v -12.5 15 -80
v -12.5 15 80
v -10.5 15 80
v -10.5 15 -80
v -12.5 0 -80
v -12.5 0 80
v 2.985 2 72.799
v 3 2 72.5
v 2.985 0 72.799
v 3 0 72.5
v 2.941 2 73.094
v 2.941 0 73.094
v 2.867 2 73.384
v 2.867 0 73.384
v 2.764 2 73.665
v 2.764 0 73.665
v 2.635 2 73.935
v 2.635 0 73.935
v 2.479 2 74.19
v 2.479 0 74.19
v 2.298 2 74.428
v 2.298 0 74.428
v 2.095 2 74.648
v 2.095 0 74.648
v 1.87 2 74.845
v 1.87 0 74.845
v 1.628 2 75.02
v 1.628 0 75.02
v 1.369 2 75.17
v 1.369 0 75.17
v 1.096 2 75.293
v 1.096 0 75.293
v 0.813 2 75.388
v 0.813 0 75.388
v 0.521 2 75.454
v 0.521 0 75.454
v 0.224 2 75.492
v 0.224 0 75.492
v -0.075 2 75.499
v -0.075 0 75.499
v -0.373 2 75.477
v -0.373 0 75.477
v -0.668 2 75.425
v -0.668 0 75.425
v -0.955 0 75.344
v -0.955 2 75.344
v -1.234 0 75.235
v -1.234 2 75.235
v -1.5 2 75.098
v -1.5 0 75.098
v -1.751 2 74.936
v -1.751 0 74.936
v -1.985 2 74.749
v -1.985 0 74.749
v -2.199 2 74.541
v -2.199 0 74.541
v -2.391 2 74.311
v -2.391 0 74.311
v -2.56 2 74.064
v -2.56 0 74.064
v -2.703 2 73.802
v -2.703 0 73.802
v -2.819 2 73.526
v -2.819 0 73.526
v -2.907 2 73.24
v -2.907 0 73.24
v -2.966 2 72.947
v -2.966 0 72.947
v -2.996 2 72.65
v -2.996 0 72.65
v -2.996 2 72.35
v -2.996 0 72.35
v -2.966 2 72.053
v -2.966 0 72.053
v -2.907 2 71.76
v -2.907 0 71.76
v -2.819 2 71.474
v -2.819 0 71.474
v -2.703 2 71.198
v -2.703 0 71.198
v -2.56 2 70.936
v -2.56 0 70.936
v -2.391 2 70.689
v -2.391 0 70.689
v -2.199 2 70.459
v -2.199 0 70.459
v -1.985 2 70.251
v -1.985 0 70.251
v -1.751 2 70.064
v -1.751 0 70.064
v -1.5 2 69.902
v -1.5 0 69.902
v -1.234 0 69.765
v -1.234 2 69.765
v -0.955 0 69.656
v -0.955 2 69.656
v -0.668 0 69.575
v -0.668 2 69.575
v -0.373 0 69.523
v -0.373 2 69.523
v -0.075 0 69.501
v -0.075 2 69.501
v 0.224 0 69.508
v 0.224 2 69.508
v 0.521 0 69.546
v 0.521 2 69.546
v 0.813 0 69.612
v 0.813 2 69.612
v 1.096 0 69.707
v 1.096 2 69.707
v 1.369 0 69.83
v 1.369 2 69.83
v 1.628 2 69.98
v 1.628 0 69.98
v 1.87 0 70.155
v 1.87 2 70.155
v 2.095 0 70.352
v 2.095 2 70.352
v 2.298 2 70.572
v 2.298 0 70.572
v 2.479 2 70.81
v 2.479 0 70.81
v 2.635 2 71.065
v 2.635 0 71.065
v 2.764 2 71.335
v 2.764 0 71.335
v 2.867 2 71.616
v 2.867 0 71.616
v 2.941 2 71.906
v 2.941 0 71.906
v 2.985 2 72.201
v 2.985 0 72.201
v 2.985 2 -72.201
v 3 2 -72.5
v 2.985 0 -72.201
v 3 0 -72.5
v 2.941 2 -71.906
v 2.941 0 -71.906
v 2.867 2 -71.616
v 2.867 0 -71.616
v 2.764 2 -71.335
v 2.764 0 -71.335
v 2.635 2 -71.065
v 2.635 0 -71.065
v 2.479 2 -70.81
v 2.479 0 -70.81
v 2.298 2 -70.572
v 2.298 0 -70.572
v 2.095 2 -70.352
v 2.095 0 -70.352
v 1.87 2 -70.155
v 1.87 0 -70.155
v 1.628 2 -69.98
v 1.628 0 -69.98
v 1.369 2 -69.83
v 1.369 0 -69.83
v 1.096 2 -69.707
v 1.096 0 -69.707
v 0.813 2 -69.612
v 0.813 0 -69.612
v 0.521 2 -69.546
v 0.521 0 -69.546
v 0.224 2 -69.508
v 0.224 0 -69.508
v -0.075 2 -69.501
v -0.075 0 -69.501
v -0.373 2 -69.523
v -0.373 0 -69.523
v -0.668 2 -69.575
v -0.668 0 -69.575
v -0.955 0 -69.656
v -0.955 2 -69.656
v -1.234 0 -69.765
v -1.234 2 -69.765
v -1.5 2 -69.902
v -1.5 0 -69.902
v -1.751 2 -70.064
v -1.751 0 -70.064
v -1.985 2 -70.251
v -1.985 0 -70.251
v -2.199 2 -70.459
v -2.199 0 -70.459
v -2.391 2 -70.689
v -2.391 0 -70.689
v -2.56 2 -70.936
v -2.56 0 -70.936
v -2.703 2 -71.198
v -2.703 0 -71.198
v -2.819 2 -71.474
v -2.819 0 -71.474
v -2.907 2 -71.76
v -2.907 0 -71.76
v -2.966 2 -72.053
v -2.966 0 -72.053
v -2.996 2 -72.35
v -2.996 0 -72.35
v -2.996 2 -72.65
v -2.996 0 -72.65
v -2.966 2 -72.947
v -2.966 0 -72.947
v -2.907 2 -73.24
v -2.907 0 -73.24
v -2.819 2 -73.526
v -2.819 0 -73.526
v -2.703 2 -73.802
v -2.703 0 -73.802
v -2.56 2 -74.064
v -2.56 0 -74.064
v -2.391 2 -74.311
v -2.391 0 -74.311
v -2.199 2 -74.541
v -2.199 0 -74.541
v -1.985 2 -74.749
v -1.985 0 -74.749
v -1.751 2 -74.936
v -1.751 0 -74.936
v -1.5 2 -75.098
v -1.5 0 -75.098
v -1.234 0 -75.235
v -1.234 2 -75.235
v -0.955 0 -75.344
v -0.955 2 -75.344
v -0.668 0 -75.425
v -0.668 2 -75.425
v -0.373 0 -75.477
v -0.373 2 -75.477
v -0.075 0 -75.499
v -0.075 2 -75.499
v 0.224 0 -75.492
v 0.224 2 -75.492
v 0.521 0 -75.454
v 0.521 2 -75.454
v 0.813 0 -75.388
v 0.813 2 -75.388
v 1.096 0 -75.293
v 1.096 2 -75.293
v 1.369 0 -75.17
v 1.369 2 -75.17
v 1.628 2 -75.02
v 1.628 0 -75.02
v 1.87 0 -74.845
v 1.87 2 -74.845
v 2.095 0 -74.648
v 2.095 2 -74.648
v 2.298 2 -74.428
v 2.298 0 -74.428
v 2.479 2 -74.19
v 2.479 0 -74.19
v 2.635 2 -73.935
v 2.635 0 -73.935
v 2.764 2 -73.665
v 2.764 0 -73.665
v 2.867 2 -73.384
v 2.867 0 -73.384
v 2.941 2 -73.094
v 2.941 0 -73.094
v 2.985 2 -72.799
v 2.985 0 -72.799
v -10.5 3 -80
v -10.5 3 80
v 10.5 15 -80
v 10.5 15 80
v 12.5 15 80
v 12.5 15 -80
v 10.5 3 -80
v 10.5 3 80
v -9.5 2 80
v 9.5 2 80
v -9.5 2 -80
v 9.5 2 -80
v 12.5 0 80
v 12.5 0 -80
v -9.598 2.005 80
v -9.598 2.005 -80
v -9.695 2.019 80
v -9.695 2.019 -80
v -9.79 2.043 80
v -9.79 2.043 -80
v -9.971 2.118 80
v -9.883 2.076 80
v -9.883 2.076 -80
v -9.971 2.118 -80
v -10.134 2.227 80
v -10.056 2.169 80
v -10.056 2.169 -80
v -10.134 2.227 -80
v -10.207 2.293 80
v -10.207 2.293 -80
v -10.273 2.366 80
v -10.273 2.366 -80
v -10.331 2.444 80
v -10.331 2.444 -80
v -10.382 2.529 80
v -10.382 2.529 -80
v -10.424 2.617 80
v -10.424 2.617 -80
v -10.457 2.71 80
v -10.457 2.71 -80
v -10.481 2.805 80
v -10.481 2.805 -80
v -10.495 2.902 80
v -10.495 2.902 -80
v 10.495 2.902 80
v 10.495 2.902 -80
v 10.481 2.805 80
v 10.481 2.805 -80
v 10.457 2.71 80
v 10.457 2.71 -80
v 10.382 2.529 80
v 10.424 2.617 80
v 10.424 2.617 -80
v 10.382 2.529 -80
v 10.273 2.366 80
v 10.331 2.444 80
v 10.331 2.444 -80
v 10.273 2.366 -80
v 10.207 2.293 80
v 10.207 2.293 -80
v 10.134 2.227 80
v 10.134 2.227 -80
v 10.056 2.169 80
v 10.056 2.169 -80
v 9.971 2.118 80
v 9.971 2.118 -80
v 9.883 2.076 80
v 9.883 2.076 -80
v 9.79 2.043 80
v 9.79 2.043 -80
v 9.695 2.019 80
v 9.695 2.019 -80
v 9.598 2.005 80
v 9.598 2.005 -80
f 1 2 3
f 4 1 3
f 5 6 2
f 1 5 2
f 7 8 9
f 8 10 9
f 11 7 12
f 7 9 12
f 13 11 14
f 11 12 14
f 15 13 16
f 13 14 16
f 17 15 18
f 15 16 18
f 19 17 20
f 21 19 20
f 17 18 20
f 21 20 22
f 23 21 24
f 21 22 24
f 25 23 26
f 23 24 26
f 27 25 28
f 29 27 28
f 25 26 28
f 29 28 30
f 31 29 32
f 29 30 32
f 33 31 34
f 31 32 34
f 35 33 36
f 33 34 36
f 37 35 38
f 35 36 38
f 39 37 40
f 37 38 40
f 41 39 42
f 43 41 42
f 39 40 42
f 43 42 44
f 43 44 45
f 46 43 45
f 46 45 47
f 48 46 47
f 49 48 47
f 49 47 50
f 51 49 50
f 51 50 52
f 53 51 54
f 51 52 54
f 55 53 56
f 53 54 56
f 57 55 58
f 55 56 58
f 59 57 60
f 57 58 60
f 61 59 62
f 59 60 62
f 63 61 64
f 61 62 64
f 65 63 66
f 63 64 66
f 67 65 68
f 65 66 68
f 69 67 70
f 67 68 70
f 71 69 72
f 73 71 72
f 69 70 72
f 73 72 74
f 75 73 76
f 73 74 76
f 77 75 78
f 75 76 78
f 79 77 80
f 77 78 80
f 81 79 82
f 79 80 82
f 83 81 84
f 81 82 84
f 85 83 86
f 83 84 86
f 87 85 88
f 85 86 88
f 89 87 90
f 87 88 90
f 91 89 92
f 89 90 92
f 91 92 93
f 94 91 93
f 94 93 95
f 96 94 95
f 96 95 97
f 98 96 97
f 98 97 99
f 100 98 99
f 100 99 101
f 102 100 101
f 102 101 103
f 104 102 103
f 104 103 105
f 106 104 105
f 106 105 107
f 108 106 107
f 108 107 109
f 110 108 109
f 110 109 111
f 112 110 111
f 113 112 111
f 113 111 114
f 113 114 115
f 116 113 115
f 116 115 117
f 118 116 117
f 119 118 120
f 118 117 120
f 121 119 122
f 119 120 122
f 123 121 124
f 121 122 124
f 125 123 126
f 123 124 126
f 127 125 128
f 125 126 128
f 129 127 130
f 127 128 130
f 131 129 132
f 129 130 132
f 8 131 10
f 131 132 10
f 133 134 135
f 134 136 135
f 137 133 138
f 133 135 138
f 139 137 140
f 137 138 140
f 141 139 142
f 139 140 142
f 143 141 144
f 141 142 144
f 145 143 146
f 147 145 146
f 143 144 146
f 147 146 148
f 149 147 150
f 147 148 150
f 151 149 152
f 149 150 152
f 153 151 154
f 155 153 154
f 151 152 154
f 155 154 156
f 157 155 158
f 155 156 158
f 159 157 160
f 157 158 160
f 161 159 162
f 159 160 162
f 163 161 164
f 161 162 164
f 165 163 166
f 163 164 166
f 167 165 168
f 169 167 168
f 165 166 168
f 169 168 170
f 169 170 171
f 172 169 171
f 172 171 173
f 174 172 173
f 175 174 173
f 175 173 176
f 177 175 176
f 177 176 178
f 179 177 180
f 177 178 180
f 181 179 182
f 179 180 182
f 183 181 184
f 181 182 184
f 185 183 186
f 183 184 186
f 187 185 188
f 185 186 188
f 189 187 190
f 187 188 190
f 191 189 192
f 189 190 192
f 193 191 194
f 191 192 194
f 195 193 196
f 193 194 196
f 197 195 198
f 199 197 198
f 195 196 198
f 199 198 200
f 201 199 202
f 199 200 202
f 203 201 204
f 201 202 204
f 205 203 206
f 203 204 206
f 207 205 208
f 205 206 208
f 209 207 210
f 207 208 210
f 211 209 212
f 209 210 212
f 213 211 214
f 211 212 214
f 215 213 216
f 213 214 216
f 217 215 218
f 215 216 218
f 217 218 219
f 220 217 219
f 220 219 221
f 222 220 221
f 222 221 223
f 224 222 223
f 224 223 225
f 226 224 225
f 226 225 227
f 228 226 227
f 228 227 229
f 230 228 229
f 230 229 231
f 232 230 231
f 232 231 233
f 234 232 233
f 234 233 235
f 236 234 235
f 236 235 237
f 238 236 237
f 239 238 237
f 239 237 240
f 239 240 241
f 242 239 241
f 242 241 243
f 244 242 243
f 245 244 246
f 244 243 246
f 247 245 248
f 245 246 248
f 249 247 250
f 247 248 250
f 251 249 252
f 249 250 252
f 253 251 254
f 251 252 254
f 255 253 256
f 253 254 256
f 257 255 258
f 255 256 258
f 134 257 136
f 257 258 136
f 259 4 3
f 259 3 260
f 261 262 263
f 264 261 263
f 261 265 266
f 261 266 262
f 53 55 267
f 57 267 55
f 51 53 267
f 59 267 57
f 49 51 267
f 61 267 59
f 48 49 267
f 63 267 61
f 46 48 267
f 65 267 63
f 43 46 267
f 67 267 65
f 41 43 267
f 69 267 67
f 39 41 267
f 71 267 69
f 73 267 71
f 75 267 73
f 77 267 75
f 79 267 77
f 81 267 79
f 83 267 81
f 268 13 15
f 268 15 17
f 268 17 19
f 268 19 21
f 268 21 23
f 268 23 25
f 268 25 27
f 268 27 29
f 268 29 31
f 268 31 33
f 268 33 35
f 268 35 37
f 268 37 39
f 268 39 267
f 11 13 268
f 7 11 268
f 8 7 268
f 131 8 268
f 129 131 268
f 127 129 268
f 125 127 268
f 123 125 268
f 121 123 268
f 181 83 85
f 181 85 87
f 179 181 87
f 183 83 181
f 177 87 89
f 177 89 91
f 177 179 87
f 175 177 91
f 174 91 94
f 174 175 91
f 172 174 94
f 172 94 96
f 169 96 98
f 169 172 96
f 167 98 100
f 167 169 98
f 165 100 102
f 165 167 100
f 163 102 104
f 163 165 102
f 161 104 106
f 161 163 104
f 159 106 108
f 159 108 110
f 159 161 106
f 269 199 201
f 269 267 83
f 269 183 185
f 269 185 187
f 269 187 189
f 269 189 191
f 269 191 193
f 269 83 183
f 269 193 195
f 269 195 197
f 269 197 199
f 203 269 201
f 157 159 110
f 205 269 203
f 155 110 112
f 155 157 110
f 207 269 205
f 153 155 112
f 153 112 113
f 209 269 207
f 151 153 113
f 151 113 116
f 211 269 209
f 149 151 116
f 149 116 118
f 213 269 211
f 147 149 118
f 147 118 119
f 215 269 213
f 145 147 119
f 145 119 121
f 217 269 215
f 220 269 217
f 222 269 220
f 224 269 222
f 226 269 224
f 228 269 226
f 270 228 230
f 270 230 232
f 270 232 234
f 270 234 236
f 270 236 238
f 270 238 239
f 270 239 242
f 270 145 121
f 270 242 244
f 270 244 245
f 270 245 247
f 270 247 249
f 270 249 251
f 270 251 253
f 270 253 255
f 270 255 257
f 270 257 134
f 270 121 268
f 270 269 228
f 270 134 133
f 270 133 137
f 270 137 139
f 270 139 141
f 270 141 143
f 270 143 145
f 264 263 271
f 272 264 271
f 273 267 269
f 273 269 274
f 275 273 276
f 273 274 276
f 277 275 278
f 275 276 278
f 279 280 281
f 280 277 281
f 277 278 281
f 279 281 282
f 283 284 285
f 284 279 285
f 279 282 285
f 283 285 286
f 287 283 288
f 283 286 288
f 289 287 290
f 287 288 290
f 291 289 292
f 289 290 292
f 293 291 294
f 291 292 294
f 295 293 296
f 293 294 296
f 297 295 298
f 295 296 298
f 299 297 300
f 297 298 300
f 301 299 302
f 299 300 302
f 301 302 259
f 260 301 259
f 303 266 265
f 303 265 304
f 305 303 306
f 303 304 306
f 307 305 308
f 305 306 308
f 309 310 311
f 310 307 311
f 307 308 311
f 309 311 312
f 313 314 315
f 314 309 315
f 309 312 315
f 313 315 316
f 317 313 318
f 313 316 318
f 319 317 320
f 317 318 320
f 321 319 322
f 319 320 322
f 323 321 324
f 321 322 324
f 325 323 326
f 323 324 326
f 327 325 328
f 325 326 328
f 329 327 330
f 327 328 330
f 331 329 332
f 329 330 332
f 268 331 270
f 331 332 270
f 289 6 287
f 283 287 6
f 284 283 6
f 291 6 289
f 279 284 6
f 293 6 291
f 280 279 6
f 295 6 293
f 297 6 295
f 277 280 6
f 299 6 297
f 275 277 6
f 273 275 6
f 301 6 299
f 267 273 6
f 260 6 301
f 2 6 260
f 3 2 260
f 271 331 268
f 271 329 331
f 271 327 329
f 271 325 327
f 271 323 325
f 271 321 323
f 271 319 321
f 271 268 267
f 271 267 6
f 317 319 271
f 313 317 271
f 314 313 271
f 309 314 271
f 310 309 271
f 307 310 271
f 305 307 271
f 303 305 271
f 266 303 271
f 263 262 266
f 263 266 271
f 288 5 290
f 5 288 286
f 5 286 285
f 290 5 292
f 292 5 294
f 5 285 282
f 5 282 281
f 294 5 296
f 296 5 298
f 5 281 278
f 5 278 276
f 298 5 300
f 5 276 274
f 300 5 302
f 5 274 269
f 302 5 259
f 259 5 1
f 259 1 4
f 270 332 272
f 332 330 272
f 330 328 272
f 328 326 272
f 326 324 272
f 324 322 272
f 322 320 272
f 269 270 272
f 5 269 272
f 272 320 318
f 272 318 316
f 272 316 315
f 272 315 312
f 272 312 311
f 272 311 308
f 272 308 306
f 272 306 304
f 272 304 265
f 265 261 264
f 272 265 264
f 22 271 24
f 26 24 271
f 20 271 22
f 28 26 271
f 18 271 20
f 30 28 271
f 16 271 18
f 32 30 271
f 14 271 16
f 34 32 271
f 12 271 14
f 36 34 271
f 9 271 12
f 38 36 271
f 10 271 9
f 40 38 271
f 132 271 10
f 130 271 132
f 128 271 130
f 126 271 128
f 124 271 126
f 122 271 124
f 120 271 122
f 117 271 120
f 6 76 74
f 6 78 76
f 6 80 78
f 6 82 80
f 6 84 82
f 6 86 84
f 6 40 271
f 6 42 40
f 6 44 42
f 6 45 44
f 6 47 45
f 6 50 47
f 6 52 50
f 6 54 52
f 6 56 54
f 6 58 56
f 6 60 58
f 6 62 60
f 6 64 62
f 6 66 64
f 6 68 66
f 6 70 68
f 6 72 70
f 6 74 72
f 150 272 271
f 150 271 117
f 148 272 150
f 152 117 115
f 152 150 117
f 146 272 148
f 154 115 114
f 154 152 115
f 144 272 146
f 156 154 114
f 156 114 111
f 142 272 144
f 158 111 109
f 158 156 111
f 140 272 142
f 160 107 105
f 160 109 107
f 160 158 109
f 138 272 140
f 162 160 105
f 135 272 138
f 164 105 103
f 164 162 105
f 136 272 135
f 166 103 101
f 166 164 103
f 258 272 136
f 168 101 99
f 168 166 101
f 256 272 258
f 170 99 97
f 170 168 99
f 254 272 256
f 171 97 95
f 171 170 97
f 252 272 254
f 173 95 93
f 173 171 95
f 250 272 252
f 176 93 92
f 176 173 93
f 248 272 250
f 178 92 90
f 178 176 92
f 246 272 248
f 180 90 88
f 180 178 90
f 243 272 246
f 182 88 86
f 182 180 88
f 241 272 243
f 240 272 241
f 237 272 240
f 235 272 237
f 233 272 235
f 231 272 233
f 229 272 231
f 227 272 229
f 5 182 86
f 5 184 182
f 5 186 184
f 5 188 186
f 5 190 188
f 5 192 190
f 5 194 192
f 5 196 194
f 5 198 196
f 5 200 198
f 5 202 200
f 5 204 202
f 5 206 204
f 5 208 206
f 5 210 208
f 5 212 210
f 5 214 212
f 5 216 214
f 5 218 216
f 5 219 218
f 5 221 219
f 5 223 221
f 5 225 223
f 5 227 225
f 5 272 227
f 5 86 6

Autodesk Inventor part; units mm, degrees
ref_plane "YZ Plane" through (0, 0, 0) normal (1, 0, 0) x (0, 1, 0)
ref_plane "XZ Plane" through (0, 0, 0) normal (0, 1, 0) x (-1, 0, 0)
ref_plane "XY Plane" through (0, 0, 0) normal (0, 0, 1) x (1, 0, 0)
sketch "Szkic1" plane through (0, 0, 0) normal (0, 0, 1) x (1, 0, 0)
  line L0 (12.5, 0) -> (-12.5, 0)
  line L1 (-12.5, 0) -> (-12.5, 15)
  line L2 (12.5, 15) -> (12.5, 0)
  line L3 (-9.5, 2) -> (9.5, 2)
  line L4 (-12.5, 15) -> (-10.5, 15)
  line L5 (10.5, 15) -> (12.5, 15)
  line L6 (-10.5, 15) -> (-10.5, 3)
  line L7 (10.5, 3) -> (10.5, 15)
  arc A0 (-10.5, 3) -> (-9.5, 2) centre (-9.5, 3) ccw
  arc A1 (9.5, 2) -> (10.5, 3) centre (9.5, 3) ccw
  dimension "d2" = 25
  dimension "d3" = 15
  dimension "d5" = 1
extrude "Wyciągnięcie proste1" add sketch "Szkic1" along normal mid plane 160
sketch "Szkic2" plane through (-12.5, 0, 80) normal (0, -1, 0) x (1, 0, 0)
  circle A0 centre (12.5, -7.5) radius 3
  circle A1 centre (12.5, -152.5) radius 3
  line L0 (0, 0) -> (0, -160) projected
  line L1 (25, -160) -> (0, -160) projected
  line L2 (0, 0) -> (25, 0) projected
  dimension "d17" = 6
  dimension "d18" = 6
  dimension "d19" = 12.5
  dimension "d20" = 12.5
  dimension "d21" = 145
  dimension "d22" = 160
  dimension "d23" = 7.5
extrude "Wyciągnięcie proste2" cut sketch "Szkic2" against normal blind 10
equation "\"d20\" = d19"
equation "\"d23\" = -0.5 * d21 + 0.5 * d22"
properties part number "ceownik-pedal" material "Aluminium"
